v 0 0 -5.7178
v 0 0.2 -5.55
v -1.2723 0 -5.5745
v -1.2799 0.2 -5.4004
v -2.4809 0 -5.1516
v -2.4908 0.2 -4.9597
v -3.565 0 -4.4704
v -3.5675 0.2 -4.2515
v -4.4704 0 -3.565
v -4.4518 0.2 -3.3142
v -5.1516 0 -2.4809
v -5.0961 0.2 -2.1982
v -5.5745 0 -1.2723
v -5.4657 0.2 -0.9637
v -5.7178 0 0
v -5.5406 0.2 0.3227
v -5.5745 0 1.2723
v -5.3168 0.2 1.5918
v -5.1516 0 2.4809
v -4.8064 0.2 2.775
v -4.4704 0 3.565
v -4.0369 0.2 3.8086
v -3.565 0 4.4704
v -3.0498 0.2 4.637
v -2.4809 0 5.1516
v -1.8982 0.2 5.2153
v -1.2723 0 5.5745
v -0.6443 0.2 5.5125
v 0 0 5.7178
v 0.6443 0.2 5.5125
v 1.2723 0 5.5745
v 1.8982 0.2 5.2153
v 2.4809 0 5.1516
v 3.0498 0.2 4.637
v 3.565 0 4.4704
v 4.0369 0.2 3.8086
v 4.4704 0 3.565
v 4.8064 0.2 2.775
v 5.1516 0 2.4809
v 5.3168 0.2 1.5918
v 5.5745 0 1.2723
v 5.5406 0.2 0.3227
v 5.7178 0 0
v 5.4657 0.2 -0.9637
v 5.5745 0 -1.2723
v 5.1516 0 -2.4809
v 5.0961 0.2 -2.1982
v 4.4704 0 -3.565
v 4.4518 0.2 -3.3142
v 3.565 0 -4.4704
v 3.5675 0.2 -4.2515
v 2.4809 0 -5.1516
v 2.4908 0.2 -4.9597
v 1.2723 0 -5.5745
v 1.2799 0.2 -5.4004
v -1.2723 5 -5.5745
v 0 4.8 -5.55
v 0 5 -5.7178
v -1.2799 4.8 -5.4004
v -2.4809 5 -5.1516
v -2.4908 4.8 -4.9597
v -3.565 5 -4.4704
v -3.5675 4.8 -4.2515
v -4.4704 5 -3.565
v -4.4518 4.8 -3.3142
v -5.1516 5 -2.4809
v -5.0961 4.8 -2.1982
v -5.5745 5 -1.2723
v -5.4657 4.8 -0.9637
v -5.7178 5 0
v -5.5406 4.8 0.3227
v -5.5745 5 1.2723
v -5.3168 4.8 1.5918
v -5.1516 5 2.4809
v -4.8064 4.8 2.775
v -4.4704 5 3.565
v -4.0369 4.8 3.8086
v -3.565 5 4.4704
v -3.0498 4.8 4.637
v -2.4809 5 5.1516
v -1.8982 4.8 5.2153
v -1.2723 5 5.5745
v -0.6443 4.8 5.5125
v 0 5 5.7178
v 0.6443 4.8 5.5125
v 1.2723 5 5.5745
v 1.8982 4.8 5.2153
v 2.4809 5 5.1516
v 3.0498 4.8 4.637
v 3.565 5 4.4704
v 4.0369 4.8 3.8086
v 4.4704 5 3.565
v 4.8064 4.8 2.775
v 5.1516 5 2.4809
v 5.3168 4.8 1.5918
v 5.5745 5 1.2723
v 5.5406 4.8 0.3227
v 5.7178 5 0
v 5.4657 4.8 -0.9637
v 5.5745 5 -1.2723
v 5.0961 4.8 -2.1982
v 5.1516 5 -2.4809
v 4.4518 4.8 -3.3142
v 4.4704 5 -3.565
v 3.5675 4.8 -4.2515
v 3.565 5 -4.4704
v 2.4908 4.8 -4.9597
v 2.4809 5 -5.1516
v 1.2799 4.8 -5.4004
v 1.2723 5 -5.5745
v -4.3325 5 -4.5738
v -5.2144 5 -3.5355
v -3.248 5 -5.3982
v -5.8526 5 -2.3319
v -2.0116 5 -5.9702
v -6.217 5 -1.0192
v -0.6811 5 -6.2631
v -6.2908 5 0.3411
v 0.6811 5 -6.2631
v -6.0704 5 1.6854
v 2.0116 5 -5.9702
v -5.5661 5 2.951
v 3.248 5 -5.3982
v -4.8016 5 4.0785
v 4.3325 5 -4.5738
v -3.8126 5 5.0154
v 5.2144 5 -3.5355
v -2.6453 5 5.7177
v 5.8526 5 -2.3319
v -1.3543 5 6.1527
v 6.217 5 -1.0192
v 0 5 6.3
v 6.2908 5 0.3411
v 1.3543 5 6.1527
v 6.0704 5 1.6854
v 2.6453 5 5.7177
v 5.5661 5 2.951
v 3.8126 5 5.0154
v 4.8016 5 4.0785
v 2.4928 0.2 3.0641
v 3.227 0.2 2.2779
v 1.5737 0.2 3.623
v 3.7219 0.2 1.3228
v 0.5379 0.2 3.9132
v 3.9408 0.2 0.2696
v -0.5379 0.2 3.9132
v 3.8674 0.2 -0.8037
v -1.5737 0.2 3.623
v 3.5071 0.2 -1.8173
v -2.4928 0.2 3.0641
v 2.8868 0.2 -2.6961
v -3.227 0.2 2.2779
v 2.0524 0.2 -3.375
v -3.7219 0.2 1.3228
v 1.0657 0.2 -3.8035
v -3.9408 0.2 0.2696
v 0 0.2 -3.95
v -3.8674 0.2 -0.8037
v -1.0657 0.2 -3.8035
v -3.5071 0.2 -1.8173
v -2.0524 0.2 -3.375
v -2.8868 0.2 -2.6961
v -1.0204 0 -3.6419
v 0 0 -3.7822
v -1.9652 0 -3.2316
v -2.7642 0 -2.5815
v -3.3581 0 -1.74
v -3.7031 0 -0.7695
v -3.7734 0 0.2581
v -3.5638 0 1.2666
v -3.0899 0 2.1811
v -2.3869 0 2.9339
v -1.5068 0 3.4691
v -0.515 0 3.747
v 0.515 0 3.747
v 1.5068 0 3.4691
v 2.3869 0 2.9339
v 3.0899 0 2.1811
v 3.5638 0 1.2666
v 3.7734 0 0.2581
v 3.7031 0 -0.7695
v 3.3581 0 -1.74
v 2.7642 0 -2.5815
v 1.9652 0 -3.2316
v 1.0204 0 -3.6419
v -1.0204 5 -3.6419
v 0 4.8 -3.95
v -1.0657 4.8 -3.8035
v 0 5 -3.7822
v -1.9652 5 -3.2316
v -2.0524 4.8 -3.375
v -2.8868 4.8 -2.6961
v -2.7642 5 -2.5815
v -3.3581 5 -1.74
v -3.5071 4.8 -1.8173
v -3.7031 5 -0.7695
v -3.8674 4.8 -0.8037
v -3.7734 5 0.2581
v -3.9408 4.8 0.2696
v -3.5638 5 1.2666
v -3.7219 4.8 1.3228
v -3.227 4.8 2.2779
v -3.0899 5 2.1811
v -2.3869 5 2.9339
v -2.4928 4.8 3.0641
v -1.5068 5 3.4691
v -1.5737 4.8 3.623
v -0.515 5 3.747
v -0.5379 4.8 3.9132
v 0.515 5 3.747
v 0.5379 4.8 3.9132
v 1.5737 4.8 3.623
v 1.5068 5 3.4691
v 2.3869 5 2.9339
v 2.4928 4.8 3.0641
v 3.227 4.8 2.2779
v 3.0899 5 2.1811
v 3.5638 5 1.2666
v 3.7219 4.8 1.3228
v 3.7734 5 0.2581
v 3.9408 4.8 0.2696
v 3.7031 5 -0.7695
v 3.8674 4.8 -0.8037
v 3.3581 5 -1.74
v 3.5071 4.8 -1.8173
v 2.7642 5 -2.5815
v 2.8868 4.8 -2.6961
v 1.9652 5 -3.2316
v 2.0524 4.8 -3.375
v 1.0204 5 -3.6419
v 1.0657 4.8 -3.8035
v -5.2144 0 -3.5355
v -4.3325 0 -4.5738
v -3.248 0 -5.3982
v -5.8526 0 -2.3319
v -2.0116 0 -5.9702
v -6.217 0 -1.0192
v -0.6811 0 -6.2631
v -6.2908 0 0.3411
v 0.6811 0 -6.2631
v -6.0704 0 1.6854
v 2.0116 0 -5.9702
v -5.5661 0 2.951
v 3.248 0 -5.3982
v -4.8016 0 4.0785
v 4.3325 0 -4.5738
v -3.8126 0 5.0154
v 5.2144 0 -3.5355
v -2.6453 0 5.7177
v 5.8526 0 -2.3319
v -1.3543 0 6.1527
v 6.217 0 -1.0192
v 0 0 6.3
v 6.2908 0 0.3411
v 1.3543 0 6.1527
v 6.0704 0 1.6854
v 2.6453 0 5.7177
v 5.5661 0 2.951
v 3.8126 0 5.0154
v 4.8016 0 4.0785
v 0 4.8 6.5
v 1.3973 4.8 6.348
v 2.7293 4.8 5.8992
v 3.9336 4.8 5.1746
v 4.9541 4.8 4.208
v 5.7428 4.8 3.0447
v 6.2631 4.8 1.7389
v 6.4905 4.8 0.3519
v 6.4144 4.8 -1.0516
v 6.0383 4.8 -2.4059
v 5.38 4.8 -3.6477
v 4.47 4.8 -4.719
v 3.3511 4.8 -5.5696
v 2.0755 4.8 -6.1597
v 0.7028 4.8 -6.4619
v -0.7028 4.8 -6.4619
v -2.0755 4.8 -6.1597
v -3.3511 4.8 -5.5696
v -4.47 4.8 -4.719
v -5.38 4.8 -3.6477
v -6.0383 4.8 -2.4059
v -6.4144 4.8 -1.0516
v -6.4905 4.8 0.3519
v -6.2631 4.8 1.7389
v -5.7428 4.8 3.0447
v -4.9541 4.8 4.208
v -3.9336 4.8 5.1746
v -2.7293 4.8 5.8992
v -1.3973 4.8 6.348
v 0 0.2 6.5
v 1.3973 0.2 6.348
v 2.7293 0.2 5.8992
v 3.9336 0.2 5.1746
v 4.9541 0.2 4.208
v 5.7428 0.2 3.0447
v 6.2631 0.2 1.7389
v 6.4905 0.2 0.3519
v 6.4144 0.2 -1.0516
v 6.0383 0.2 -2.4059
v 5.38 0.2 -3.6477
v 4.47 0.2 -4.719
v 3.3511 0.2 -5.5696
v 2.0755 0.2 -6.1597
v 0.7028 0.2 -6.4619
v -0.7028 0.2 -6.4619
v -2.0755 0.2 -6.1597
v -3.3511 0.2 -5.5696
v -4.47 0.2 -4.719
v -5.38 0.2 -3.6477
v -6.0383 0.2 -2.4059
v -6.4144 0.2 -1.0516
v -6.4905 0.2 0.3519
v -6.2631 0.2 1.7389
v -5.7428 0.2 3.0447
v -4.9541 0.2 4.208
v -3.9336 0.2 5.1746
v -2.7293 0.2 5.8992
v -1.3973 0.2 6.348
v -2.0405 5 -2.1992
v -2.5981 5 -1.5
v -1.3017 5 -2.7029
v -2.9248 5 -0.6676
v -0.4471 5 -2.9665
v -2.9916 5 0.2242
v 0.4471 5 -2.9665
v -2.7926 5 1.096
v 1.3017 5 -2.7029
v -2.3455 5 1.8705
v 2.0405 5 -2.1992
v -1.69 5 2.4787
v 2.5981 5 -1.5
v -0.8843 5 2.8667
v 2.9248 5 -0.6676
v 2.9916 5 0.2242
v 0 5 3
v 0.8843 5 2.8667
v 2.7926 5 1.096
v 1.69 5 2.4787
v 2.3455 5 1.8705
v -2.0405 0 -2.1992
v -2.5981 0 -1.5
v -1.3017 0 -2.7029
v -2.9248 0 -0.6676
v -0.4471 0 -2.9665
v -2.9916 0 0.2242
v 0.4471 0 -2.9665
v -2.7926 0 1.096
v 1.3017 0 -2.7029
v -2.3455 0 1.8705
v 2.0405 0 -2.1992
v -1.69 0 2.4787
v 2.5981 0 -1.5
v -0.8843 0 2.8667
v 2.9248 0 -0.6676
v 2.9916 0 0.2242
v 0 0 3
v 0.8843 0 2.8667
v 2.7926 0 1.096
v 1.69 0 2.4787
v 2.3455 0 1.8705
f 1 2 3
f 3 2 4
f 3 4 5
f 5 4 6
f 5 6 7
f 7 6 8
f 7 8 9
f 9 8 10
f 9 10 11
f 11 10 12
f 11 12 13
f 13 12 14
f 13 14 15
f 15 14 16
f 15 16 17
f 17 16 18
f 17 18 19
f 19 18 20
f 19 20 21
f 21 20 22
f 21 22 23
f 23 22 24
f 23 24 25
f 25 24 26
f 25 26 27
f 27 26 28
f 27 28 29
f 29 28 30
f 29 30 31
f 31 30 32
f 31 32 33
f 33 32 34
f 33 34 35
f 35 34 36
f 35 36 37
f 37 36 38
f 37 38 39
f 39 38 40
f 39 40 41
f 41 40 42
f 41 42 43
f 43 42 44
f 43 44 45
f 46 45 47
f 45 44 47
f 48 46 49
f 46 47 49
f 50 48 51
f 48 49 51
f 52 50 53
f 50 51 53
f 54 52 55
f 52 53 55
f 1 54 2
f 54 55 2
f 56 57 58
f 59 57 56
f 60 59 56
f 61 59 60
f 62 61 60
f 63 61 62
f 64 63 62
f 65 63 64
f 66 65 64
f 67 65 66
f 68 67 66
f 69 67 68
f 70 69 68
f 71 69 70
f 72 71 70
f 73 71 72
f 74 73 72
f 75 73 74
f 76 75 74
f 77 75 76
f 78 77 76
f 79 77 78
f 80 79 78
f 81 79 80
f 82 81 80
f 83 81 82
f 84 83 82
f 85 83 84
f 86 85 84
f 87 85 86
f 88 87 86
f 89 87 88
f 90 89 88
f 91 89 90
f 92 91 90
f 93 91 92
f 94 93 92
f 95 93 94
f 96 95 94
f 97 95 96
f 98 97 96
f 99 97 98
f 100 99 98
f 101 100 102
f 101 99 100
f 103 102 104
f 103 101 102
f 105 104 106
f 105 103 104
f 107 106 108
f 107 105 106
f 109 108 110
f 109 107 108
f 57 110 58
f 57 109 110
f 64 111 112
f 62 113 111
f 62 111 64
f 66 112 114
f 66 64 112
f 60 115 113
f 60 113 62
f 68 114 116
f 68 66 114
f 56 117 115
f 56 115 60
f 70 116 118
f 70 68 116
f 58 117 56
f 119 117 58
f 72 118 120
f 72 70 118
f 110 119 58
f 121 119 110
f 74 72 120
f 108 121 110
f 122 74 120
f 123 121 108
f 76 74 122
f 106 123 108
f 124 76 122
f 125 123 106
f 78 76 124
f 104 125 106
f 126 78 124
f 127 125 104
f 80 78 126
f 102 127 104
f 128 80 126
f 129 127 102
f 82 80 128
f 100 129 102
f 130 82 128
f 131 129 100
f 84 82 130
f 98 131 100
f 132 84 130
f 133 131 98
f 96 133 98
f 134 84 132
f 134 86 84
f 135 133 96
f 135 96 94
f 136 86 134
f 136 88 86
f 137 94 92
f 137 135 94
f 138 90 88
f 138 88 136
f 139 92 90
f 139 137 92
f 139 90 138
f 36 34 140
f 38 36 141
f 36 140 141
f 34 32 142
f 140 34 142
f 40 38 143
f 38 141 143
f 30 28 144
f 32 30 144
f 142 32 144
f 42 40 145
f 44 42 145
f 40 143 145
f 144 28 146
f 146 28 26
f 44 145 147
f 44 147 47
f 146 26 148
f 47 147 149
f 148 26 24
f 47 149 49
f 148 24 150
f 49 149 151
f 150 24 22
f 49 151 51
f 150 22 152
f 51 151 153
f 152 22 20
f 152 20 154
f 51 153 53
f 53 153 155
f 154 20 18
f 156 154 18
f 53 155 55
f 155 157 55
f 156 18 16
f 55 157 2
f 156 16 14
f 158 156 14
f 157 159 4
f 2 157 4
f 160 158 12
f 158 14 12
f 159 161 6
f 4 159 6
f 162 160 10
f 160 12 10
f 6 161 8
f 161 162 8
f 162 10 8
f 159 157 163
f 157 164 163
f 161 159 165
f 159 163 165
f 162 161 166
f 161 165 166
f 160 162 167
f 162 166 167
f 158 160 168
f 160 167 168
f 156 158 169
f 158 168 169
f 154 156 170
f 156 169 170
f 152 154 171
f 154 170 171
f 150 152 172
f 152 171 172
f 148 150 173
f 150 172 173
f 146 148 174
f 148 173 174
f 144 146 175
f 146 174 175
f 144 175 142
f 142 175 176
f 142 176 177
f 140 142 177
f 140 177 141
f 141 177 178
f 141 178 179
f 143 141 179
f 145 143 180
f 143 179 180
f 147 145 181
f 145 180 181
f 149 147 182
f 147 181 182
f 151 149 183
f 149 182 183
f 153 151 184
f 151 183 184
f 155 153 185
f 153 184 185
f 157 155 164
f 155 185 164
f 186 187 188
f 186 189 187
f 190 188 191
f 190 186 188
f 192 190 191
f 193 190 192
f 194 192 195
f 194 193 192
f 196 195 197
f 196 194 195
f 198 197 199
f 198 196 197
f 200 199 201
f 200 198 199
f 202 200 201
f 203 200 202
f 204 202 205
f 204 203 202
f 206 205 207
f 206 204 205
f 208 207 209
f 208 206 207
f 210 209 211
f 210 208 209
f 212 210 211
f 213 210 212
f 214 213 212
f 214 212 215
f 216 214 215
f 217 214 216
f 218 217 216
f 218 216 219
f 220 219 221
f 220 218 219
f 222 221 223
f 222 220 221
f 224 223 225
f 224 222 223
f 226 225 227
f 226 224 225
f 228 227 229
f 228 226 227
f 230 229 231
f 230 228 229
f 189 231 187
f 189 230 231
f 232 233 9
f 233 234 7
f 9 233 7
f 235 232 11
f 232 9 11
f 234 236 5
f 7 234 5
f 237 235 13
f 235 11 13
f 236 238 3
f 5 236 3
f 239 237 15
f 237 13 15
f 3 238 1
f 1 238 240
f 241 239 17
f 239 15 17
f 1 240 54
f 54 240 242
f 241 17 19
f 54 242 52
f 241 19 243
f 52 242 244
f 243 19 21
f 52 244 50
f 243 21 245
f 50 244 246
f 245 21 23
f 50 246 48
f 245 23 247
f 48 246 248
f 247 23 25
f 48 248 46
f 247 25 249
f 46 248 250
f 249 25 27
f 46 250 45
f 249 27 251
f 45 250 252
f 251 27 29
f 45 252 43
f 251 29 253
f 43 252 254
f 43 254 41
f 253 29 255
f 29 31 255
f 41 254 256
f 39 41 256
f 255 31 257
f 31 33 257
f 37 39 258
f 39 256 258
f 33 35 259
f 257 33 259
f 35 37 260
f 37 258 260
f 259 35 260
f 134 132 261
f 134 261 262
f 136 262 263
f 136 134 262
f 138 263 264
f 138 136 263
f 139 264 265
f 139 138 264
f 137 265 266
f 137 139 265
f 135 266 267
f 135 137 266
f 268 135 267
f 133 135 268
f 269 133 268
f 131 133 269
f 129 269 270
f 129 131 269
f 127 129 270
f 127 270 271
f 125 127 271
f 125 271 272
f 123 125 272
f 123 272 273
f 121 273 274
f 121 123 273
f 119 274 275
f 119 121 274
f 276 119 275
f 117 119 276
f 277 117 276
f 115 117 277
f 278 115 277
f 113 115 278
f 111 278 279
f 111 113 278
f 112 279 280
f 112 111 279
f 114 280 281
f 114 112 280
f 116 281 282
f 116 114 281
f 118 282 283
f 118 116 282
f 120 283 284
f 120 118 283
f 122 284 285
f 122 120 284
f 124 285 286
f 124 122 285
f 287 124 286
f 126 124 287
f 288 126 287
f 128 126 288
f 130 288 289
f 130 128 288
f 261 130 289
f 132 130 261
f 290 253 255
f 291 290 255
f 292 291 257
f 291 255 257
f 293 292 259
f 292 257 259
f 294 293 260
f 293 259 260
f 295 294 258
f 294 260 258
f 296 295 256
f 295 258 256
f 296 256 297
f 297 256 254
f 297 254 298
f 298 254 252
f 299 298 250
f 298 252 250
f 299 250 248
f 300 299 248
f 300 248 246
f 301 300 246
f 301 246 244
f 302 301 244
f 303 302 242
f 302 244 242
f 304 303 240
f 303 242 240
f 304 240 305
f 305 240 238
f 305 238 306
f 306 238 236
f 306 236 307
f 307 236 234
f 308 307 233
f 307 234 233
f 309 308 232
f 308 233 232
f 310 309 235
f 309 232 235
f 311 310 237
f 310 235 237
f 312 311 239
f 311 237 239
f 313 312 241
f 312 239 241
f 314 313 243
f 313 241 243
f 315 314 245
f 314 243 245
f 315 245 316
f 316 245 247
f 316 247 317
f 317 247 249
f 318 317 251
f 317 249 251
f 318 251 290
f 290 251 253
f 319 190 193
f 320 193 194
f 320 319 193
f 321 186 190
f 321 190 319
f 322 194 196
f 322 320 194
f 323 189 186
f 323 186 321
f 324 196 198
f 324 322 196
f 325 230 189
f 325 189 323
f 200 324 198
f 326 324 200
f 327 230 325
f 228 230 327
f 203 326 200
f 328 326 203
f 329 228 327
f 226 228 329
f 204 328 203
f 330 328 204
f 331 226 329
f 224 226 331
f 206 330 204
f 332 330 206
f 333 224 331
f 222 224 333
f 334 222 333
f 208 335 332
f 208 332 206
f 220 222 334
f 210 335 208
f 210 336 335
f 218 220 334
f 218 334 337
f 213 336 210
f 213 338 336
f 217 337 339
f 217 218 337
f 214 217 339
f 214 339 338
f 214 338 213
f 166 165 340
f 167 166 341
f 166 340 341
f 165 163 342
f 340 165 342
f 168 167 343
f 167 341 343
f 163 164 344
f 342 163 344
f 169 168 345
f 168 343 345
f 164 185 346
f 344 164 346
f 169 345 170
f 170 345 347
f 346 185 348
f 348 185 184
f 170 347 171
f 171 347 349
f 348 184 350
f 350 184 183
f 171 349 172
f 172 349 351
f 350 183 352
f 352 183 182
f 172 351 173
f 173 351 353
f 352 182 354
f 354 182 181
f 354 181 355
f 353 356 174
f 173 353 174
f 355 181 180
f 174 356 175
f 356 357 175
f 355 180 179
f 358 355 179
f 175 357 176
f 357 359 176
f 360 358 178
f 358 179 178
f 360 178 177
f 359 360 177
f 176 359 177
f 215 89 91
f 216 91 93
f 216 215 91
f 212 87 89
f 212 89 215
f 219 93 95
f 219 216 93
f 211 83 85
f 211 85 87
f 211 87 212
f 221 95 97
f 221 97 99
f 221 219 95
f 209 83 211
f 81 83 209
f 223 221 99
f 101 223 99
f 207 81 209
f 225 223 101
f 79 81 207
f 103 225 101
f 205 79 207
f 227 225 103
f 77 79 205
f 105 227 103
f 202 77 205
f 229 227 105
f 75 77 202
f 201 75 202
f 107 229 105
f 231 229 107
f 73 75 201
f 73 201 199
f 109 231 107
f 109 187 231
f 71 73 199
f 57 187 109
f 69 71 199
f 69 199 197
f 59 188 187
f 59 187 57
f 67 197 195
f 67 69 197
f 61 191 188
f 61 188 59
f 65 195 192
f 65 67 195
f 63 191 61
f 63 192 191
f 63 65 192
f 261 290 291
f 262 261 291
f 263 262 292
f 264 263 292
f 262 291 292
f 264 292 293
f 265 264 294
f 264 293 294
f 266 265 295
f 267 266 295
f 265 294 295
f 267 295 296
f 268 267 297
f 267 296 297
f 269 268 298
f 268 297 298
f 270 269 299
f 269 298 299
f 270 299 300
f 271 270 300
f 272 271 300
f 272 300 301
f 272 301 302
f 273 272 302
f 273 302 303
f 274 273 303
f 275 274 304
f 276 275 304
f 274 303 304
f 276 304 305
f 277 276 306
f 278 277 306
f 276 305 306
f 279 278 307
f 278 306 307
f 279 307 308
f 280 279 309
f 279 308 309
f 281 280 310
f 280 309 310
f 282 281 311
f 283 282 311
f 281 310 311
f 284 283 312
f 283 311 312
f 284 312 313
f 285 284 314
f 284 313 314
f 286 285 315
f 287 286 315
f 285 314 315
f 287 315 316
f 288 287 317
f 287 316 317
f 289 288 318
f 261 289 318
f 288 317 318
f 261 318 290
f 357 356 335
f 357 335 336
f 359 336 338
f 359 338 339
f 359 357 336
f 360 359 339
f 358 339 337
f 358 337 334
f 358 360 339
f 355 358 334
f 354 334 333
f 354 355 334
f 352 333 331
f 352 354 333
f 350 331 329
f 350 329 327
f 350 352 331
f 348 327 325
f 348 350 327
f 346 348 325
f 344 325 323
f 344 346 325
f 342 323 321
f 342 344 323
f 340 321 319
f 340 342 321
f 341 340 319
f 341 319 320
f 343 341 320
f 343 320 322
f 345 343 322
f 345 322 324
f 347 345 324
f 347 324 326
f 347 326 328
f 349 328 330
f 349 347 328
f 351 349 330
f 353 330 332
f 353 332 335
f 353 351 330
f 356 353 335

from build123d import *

# Parameters (mm, degrees)
SKETCH_1_R      = 6.5
SKETCH_1_R_2    = 3
EXTRUDE_1_DEPTH = 5
CHAMFER_1_SIZE  = 0.2


with BuildPart() as part:
    # 草图1 → 凸台-拉伸1 (new body)
    with BuildSketch(Plane(origin=(0, 0, 0), x_dir=(1, 0, 0), z_dir=(0, 1, 0))):
        with Locations(Location((0, 0, 0), (0, 0, 270))):
            Circle(SKETCH_1_R)
        with Locations(Location((0, 0, 0), (0, 0, 270))):
            Circle(SKETCH_1_R_2, mode=Mode.SUBTRACT)
    extrude(amount=EXTRUDE_1_DEPTH)

    # 草图2 → 切除-旋转1 (revolve, cut)
    with BuildSketch(Plane(origin=(0, 0, 0), x_dir=(0, 0, -1), z_dir=(1, 0, 0)), mode=Mode.PRIVATE) as cut_revolve_1_sk:
        Polygon((-5.717819926, 5), (-5.55, 4.8), (-3.95, 4.8), (-3.782180074, 5), align=None)
        Polygon((-3.95, 0.2), (-3.782180074, 0), (-5.717819926, 0), (-5.55, 0.2), align=None)
    revolve(cut_revolve_1_sk.sketch.rotate(Axis((0, 0, 0), (0, 1, 0)), 180), axis=Axis((0, 0, 0), (0, 1, 0)), mode=Mode.SUBTRACT)

    # 倒角1
    chamfer_1_edges = [part.edges().sort_by_distance(p)[0] for p in [
        (0, 0, -6.5),
        (0, 5, -6.5),
    ]]
    chamfer(chamfer_1_edges, length=CHAMFER_1_SIZE)


solid = part.part
